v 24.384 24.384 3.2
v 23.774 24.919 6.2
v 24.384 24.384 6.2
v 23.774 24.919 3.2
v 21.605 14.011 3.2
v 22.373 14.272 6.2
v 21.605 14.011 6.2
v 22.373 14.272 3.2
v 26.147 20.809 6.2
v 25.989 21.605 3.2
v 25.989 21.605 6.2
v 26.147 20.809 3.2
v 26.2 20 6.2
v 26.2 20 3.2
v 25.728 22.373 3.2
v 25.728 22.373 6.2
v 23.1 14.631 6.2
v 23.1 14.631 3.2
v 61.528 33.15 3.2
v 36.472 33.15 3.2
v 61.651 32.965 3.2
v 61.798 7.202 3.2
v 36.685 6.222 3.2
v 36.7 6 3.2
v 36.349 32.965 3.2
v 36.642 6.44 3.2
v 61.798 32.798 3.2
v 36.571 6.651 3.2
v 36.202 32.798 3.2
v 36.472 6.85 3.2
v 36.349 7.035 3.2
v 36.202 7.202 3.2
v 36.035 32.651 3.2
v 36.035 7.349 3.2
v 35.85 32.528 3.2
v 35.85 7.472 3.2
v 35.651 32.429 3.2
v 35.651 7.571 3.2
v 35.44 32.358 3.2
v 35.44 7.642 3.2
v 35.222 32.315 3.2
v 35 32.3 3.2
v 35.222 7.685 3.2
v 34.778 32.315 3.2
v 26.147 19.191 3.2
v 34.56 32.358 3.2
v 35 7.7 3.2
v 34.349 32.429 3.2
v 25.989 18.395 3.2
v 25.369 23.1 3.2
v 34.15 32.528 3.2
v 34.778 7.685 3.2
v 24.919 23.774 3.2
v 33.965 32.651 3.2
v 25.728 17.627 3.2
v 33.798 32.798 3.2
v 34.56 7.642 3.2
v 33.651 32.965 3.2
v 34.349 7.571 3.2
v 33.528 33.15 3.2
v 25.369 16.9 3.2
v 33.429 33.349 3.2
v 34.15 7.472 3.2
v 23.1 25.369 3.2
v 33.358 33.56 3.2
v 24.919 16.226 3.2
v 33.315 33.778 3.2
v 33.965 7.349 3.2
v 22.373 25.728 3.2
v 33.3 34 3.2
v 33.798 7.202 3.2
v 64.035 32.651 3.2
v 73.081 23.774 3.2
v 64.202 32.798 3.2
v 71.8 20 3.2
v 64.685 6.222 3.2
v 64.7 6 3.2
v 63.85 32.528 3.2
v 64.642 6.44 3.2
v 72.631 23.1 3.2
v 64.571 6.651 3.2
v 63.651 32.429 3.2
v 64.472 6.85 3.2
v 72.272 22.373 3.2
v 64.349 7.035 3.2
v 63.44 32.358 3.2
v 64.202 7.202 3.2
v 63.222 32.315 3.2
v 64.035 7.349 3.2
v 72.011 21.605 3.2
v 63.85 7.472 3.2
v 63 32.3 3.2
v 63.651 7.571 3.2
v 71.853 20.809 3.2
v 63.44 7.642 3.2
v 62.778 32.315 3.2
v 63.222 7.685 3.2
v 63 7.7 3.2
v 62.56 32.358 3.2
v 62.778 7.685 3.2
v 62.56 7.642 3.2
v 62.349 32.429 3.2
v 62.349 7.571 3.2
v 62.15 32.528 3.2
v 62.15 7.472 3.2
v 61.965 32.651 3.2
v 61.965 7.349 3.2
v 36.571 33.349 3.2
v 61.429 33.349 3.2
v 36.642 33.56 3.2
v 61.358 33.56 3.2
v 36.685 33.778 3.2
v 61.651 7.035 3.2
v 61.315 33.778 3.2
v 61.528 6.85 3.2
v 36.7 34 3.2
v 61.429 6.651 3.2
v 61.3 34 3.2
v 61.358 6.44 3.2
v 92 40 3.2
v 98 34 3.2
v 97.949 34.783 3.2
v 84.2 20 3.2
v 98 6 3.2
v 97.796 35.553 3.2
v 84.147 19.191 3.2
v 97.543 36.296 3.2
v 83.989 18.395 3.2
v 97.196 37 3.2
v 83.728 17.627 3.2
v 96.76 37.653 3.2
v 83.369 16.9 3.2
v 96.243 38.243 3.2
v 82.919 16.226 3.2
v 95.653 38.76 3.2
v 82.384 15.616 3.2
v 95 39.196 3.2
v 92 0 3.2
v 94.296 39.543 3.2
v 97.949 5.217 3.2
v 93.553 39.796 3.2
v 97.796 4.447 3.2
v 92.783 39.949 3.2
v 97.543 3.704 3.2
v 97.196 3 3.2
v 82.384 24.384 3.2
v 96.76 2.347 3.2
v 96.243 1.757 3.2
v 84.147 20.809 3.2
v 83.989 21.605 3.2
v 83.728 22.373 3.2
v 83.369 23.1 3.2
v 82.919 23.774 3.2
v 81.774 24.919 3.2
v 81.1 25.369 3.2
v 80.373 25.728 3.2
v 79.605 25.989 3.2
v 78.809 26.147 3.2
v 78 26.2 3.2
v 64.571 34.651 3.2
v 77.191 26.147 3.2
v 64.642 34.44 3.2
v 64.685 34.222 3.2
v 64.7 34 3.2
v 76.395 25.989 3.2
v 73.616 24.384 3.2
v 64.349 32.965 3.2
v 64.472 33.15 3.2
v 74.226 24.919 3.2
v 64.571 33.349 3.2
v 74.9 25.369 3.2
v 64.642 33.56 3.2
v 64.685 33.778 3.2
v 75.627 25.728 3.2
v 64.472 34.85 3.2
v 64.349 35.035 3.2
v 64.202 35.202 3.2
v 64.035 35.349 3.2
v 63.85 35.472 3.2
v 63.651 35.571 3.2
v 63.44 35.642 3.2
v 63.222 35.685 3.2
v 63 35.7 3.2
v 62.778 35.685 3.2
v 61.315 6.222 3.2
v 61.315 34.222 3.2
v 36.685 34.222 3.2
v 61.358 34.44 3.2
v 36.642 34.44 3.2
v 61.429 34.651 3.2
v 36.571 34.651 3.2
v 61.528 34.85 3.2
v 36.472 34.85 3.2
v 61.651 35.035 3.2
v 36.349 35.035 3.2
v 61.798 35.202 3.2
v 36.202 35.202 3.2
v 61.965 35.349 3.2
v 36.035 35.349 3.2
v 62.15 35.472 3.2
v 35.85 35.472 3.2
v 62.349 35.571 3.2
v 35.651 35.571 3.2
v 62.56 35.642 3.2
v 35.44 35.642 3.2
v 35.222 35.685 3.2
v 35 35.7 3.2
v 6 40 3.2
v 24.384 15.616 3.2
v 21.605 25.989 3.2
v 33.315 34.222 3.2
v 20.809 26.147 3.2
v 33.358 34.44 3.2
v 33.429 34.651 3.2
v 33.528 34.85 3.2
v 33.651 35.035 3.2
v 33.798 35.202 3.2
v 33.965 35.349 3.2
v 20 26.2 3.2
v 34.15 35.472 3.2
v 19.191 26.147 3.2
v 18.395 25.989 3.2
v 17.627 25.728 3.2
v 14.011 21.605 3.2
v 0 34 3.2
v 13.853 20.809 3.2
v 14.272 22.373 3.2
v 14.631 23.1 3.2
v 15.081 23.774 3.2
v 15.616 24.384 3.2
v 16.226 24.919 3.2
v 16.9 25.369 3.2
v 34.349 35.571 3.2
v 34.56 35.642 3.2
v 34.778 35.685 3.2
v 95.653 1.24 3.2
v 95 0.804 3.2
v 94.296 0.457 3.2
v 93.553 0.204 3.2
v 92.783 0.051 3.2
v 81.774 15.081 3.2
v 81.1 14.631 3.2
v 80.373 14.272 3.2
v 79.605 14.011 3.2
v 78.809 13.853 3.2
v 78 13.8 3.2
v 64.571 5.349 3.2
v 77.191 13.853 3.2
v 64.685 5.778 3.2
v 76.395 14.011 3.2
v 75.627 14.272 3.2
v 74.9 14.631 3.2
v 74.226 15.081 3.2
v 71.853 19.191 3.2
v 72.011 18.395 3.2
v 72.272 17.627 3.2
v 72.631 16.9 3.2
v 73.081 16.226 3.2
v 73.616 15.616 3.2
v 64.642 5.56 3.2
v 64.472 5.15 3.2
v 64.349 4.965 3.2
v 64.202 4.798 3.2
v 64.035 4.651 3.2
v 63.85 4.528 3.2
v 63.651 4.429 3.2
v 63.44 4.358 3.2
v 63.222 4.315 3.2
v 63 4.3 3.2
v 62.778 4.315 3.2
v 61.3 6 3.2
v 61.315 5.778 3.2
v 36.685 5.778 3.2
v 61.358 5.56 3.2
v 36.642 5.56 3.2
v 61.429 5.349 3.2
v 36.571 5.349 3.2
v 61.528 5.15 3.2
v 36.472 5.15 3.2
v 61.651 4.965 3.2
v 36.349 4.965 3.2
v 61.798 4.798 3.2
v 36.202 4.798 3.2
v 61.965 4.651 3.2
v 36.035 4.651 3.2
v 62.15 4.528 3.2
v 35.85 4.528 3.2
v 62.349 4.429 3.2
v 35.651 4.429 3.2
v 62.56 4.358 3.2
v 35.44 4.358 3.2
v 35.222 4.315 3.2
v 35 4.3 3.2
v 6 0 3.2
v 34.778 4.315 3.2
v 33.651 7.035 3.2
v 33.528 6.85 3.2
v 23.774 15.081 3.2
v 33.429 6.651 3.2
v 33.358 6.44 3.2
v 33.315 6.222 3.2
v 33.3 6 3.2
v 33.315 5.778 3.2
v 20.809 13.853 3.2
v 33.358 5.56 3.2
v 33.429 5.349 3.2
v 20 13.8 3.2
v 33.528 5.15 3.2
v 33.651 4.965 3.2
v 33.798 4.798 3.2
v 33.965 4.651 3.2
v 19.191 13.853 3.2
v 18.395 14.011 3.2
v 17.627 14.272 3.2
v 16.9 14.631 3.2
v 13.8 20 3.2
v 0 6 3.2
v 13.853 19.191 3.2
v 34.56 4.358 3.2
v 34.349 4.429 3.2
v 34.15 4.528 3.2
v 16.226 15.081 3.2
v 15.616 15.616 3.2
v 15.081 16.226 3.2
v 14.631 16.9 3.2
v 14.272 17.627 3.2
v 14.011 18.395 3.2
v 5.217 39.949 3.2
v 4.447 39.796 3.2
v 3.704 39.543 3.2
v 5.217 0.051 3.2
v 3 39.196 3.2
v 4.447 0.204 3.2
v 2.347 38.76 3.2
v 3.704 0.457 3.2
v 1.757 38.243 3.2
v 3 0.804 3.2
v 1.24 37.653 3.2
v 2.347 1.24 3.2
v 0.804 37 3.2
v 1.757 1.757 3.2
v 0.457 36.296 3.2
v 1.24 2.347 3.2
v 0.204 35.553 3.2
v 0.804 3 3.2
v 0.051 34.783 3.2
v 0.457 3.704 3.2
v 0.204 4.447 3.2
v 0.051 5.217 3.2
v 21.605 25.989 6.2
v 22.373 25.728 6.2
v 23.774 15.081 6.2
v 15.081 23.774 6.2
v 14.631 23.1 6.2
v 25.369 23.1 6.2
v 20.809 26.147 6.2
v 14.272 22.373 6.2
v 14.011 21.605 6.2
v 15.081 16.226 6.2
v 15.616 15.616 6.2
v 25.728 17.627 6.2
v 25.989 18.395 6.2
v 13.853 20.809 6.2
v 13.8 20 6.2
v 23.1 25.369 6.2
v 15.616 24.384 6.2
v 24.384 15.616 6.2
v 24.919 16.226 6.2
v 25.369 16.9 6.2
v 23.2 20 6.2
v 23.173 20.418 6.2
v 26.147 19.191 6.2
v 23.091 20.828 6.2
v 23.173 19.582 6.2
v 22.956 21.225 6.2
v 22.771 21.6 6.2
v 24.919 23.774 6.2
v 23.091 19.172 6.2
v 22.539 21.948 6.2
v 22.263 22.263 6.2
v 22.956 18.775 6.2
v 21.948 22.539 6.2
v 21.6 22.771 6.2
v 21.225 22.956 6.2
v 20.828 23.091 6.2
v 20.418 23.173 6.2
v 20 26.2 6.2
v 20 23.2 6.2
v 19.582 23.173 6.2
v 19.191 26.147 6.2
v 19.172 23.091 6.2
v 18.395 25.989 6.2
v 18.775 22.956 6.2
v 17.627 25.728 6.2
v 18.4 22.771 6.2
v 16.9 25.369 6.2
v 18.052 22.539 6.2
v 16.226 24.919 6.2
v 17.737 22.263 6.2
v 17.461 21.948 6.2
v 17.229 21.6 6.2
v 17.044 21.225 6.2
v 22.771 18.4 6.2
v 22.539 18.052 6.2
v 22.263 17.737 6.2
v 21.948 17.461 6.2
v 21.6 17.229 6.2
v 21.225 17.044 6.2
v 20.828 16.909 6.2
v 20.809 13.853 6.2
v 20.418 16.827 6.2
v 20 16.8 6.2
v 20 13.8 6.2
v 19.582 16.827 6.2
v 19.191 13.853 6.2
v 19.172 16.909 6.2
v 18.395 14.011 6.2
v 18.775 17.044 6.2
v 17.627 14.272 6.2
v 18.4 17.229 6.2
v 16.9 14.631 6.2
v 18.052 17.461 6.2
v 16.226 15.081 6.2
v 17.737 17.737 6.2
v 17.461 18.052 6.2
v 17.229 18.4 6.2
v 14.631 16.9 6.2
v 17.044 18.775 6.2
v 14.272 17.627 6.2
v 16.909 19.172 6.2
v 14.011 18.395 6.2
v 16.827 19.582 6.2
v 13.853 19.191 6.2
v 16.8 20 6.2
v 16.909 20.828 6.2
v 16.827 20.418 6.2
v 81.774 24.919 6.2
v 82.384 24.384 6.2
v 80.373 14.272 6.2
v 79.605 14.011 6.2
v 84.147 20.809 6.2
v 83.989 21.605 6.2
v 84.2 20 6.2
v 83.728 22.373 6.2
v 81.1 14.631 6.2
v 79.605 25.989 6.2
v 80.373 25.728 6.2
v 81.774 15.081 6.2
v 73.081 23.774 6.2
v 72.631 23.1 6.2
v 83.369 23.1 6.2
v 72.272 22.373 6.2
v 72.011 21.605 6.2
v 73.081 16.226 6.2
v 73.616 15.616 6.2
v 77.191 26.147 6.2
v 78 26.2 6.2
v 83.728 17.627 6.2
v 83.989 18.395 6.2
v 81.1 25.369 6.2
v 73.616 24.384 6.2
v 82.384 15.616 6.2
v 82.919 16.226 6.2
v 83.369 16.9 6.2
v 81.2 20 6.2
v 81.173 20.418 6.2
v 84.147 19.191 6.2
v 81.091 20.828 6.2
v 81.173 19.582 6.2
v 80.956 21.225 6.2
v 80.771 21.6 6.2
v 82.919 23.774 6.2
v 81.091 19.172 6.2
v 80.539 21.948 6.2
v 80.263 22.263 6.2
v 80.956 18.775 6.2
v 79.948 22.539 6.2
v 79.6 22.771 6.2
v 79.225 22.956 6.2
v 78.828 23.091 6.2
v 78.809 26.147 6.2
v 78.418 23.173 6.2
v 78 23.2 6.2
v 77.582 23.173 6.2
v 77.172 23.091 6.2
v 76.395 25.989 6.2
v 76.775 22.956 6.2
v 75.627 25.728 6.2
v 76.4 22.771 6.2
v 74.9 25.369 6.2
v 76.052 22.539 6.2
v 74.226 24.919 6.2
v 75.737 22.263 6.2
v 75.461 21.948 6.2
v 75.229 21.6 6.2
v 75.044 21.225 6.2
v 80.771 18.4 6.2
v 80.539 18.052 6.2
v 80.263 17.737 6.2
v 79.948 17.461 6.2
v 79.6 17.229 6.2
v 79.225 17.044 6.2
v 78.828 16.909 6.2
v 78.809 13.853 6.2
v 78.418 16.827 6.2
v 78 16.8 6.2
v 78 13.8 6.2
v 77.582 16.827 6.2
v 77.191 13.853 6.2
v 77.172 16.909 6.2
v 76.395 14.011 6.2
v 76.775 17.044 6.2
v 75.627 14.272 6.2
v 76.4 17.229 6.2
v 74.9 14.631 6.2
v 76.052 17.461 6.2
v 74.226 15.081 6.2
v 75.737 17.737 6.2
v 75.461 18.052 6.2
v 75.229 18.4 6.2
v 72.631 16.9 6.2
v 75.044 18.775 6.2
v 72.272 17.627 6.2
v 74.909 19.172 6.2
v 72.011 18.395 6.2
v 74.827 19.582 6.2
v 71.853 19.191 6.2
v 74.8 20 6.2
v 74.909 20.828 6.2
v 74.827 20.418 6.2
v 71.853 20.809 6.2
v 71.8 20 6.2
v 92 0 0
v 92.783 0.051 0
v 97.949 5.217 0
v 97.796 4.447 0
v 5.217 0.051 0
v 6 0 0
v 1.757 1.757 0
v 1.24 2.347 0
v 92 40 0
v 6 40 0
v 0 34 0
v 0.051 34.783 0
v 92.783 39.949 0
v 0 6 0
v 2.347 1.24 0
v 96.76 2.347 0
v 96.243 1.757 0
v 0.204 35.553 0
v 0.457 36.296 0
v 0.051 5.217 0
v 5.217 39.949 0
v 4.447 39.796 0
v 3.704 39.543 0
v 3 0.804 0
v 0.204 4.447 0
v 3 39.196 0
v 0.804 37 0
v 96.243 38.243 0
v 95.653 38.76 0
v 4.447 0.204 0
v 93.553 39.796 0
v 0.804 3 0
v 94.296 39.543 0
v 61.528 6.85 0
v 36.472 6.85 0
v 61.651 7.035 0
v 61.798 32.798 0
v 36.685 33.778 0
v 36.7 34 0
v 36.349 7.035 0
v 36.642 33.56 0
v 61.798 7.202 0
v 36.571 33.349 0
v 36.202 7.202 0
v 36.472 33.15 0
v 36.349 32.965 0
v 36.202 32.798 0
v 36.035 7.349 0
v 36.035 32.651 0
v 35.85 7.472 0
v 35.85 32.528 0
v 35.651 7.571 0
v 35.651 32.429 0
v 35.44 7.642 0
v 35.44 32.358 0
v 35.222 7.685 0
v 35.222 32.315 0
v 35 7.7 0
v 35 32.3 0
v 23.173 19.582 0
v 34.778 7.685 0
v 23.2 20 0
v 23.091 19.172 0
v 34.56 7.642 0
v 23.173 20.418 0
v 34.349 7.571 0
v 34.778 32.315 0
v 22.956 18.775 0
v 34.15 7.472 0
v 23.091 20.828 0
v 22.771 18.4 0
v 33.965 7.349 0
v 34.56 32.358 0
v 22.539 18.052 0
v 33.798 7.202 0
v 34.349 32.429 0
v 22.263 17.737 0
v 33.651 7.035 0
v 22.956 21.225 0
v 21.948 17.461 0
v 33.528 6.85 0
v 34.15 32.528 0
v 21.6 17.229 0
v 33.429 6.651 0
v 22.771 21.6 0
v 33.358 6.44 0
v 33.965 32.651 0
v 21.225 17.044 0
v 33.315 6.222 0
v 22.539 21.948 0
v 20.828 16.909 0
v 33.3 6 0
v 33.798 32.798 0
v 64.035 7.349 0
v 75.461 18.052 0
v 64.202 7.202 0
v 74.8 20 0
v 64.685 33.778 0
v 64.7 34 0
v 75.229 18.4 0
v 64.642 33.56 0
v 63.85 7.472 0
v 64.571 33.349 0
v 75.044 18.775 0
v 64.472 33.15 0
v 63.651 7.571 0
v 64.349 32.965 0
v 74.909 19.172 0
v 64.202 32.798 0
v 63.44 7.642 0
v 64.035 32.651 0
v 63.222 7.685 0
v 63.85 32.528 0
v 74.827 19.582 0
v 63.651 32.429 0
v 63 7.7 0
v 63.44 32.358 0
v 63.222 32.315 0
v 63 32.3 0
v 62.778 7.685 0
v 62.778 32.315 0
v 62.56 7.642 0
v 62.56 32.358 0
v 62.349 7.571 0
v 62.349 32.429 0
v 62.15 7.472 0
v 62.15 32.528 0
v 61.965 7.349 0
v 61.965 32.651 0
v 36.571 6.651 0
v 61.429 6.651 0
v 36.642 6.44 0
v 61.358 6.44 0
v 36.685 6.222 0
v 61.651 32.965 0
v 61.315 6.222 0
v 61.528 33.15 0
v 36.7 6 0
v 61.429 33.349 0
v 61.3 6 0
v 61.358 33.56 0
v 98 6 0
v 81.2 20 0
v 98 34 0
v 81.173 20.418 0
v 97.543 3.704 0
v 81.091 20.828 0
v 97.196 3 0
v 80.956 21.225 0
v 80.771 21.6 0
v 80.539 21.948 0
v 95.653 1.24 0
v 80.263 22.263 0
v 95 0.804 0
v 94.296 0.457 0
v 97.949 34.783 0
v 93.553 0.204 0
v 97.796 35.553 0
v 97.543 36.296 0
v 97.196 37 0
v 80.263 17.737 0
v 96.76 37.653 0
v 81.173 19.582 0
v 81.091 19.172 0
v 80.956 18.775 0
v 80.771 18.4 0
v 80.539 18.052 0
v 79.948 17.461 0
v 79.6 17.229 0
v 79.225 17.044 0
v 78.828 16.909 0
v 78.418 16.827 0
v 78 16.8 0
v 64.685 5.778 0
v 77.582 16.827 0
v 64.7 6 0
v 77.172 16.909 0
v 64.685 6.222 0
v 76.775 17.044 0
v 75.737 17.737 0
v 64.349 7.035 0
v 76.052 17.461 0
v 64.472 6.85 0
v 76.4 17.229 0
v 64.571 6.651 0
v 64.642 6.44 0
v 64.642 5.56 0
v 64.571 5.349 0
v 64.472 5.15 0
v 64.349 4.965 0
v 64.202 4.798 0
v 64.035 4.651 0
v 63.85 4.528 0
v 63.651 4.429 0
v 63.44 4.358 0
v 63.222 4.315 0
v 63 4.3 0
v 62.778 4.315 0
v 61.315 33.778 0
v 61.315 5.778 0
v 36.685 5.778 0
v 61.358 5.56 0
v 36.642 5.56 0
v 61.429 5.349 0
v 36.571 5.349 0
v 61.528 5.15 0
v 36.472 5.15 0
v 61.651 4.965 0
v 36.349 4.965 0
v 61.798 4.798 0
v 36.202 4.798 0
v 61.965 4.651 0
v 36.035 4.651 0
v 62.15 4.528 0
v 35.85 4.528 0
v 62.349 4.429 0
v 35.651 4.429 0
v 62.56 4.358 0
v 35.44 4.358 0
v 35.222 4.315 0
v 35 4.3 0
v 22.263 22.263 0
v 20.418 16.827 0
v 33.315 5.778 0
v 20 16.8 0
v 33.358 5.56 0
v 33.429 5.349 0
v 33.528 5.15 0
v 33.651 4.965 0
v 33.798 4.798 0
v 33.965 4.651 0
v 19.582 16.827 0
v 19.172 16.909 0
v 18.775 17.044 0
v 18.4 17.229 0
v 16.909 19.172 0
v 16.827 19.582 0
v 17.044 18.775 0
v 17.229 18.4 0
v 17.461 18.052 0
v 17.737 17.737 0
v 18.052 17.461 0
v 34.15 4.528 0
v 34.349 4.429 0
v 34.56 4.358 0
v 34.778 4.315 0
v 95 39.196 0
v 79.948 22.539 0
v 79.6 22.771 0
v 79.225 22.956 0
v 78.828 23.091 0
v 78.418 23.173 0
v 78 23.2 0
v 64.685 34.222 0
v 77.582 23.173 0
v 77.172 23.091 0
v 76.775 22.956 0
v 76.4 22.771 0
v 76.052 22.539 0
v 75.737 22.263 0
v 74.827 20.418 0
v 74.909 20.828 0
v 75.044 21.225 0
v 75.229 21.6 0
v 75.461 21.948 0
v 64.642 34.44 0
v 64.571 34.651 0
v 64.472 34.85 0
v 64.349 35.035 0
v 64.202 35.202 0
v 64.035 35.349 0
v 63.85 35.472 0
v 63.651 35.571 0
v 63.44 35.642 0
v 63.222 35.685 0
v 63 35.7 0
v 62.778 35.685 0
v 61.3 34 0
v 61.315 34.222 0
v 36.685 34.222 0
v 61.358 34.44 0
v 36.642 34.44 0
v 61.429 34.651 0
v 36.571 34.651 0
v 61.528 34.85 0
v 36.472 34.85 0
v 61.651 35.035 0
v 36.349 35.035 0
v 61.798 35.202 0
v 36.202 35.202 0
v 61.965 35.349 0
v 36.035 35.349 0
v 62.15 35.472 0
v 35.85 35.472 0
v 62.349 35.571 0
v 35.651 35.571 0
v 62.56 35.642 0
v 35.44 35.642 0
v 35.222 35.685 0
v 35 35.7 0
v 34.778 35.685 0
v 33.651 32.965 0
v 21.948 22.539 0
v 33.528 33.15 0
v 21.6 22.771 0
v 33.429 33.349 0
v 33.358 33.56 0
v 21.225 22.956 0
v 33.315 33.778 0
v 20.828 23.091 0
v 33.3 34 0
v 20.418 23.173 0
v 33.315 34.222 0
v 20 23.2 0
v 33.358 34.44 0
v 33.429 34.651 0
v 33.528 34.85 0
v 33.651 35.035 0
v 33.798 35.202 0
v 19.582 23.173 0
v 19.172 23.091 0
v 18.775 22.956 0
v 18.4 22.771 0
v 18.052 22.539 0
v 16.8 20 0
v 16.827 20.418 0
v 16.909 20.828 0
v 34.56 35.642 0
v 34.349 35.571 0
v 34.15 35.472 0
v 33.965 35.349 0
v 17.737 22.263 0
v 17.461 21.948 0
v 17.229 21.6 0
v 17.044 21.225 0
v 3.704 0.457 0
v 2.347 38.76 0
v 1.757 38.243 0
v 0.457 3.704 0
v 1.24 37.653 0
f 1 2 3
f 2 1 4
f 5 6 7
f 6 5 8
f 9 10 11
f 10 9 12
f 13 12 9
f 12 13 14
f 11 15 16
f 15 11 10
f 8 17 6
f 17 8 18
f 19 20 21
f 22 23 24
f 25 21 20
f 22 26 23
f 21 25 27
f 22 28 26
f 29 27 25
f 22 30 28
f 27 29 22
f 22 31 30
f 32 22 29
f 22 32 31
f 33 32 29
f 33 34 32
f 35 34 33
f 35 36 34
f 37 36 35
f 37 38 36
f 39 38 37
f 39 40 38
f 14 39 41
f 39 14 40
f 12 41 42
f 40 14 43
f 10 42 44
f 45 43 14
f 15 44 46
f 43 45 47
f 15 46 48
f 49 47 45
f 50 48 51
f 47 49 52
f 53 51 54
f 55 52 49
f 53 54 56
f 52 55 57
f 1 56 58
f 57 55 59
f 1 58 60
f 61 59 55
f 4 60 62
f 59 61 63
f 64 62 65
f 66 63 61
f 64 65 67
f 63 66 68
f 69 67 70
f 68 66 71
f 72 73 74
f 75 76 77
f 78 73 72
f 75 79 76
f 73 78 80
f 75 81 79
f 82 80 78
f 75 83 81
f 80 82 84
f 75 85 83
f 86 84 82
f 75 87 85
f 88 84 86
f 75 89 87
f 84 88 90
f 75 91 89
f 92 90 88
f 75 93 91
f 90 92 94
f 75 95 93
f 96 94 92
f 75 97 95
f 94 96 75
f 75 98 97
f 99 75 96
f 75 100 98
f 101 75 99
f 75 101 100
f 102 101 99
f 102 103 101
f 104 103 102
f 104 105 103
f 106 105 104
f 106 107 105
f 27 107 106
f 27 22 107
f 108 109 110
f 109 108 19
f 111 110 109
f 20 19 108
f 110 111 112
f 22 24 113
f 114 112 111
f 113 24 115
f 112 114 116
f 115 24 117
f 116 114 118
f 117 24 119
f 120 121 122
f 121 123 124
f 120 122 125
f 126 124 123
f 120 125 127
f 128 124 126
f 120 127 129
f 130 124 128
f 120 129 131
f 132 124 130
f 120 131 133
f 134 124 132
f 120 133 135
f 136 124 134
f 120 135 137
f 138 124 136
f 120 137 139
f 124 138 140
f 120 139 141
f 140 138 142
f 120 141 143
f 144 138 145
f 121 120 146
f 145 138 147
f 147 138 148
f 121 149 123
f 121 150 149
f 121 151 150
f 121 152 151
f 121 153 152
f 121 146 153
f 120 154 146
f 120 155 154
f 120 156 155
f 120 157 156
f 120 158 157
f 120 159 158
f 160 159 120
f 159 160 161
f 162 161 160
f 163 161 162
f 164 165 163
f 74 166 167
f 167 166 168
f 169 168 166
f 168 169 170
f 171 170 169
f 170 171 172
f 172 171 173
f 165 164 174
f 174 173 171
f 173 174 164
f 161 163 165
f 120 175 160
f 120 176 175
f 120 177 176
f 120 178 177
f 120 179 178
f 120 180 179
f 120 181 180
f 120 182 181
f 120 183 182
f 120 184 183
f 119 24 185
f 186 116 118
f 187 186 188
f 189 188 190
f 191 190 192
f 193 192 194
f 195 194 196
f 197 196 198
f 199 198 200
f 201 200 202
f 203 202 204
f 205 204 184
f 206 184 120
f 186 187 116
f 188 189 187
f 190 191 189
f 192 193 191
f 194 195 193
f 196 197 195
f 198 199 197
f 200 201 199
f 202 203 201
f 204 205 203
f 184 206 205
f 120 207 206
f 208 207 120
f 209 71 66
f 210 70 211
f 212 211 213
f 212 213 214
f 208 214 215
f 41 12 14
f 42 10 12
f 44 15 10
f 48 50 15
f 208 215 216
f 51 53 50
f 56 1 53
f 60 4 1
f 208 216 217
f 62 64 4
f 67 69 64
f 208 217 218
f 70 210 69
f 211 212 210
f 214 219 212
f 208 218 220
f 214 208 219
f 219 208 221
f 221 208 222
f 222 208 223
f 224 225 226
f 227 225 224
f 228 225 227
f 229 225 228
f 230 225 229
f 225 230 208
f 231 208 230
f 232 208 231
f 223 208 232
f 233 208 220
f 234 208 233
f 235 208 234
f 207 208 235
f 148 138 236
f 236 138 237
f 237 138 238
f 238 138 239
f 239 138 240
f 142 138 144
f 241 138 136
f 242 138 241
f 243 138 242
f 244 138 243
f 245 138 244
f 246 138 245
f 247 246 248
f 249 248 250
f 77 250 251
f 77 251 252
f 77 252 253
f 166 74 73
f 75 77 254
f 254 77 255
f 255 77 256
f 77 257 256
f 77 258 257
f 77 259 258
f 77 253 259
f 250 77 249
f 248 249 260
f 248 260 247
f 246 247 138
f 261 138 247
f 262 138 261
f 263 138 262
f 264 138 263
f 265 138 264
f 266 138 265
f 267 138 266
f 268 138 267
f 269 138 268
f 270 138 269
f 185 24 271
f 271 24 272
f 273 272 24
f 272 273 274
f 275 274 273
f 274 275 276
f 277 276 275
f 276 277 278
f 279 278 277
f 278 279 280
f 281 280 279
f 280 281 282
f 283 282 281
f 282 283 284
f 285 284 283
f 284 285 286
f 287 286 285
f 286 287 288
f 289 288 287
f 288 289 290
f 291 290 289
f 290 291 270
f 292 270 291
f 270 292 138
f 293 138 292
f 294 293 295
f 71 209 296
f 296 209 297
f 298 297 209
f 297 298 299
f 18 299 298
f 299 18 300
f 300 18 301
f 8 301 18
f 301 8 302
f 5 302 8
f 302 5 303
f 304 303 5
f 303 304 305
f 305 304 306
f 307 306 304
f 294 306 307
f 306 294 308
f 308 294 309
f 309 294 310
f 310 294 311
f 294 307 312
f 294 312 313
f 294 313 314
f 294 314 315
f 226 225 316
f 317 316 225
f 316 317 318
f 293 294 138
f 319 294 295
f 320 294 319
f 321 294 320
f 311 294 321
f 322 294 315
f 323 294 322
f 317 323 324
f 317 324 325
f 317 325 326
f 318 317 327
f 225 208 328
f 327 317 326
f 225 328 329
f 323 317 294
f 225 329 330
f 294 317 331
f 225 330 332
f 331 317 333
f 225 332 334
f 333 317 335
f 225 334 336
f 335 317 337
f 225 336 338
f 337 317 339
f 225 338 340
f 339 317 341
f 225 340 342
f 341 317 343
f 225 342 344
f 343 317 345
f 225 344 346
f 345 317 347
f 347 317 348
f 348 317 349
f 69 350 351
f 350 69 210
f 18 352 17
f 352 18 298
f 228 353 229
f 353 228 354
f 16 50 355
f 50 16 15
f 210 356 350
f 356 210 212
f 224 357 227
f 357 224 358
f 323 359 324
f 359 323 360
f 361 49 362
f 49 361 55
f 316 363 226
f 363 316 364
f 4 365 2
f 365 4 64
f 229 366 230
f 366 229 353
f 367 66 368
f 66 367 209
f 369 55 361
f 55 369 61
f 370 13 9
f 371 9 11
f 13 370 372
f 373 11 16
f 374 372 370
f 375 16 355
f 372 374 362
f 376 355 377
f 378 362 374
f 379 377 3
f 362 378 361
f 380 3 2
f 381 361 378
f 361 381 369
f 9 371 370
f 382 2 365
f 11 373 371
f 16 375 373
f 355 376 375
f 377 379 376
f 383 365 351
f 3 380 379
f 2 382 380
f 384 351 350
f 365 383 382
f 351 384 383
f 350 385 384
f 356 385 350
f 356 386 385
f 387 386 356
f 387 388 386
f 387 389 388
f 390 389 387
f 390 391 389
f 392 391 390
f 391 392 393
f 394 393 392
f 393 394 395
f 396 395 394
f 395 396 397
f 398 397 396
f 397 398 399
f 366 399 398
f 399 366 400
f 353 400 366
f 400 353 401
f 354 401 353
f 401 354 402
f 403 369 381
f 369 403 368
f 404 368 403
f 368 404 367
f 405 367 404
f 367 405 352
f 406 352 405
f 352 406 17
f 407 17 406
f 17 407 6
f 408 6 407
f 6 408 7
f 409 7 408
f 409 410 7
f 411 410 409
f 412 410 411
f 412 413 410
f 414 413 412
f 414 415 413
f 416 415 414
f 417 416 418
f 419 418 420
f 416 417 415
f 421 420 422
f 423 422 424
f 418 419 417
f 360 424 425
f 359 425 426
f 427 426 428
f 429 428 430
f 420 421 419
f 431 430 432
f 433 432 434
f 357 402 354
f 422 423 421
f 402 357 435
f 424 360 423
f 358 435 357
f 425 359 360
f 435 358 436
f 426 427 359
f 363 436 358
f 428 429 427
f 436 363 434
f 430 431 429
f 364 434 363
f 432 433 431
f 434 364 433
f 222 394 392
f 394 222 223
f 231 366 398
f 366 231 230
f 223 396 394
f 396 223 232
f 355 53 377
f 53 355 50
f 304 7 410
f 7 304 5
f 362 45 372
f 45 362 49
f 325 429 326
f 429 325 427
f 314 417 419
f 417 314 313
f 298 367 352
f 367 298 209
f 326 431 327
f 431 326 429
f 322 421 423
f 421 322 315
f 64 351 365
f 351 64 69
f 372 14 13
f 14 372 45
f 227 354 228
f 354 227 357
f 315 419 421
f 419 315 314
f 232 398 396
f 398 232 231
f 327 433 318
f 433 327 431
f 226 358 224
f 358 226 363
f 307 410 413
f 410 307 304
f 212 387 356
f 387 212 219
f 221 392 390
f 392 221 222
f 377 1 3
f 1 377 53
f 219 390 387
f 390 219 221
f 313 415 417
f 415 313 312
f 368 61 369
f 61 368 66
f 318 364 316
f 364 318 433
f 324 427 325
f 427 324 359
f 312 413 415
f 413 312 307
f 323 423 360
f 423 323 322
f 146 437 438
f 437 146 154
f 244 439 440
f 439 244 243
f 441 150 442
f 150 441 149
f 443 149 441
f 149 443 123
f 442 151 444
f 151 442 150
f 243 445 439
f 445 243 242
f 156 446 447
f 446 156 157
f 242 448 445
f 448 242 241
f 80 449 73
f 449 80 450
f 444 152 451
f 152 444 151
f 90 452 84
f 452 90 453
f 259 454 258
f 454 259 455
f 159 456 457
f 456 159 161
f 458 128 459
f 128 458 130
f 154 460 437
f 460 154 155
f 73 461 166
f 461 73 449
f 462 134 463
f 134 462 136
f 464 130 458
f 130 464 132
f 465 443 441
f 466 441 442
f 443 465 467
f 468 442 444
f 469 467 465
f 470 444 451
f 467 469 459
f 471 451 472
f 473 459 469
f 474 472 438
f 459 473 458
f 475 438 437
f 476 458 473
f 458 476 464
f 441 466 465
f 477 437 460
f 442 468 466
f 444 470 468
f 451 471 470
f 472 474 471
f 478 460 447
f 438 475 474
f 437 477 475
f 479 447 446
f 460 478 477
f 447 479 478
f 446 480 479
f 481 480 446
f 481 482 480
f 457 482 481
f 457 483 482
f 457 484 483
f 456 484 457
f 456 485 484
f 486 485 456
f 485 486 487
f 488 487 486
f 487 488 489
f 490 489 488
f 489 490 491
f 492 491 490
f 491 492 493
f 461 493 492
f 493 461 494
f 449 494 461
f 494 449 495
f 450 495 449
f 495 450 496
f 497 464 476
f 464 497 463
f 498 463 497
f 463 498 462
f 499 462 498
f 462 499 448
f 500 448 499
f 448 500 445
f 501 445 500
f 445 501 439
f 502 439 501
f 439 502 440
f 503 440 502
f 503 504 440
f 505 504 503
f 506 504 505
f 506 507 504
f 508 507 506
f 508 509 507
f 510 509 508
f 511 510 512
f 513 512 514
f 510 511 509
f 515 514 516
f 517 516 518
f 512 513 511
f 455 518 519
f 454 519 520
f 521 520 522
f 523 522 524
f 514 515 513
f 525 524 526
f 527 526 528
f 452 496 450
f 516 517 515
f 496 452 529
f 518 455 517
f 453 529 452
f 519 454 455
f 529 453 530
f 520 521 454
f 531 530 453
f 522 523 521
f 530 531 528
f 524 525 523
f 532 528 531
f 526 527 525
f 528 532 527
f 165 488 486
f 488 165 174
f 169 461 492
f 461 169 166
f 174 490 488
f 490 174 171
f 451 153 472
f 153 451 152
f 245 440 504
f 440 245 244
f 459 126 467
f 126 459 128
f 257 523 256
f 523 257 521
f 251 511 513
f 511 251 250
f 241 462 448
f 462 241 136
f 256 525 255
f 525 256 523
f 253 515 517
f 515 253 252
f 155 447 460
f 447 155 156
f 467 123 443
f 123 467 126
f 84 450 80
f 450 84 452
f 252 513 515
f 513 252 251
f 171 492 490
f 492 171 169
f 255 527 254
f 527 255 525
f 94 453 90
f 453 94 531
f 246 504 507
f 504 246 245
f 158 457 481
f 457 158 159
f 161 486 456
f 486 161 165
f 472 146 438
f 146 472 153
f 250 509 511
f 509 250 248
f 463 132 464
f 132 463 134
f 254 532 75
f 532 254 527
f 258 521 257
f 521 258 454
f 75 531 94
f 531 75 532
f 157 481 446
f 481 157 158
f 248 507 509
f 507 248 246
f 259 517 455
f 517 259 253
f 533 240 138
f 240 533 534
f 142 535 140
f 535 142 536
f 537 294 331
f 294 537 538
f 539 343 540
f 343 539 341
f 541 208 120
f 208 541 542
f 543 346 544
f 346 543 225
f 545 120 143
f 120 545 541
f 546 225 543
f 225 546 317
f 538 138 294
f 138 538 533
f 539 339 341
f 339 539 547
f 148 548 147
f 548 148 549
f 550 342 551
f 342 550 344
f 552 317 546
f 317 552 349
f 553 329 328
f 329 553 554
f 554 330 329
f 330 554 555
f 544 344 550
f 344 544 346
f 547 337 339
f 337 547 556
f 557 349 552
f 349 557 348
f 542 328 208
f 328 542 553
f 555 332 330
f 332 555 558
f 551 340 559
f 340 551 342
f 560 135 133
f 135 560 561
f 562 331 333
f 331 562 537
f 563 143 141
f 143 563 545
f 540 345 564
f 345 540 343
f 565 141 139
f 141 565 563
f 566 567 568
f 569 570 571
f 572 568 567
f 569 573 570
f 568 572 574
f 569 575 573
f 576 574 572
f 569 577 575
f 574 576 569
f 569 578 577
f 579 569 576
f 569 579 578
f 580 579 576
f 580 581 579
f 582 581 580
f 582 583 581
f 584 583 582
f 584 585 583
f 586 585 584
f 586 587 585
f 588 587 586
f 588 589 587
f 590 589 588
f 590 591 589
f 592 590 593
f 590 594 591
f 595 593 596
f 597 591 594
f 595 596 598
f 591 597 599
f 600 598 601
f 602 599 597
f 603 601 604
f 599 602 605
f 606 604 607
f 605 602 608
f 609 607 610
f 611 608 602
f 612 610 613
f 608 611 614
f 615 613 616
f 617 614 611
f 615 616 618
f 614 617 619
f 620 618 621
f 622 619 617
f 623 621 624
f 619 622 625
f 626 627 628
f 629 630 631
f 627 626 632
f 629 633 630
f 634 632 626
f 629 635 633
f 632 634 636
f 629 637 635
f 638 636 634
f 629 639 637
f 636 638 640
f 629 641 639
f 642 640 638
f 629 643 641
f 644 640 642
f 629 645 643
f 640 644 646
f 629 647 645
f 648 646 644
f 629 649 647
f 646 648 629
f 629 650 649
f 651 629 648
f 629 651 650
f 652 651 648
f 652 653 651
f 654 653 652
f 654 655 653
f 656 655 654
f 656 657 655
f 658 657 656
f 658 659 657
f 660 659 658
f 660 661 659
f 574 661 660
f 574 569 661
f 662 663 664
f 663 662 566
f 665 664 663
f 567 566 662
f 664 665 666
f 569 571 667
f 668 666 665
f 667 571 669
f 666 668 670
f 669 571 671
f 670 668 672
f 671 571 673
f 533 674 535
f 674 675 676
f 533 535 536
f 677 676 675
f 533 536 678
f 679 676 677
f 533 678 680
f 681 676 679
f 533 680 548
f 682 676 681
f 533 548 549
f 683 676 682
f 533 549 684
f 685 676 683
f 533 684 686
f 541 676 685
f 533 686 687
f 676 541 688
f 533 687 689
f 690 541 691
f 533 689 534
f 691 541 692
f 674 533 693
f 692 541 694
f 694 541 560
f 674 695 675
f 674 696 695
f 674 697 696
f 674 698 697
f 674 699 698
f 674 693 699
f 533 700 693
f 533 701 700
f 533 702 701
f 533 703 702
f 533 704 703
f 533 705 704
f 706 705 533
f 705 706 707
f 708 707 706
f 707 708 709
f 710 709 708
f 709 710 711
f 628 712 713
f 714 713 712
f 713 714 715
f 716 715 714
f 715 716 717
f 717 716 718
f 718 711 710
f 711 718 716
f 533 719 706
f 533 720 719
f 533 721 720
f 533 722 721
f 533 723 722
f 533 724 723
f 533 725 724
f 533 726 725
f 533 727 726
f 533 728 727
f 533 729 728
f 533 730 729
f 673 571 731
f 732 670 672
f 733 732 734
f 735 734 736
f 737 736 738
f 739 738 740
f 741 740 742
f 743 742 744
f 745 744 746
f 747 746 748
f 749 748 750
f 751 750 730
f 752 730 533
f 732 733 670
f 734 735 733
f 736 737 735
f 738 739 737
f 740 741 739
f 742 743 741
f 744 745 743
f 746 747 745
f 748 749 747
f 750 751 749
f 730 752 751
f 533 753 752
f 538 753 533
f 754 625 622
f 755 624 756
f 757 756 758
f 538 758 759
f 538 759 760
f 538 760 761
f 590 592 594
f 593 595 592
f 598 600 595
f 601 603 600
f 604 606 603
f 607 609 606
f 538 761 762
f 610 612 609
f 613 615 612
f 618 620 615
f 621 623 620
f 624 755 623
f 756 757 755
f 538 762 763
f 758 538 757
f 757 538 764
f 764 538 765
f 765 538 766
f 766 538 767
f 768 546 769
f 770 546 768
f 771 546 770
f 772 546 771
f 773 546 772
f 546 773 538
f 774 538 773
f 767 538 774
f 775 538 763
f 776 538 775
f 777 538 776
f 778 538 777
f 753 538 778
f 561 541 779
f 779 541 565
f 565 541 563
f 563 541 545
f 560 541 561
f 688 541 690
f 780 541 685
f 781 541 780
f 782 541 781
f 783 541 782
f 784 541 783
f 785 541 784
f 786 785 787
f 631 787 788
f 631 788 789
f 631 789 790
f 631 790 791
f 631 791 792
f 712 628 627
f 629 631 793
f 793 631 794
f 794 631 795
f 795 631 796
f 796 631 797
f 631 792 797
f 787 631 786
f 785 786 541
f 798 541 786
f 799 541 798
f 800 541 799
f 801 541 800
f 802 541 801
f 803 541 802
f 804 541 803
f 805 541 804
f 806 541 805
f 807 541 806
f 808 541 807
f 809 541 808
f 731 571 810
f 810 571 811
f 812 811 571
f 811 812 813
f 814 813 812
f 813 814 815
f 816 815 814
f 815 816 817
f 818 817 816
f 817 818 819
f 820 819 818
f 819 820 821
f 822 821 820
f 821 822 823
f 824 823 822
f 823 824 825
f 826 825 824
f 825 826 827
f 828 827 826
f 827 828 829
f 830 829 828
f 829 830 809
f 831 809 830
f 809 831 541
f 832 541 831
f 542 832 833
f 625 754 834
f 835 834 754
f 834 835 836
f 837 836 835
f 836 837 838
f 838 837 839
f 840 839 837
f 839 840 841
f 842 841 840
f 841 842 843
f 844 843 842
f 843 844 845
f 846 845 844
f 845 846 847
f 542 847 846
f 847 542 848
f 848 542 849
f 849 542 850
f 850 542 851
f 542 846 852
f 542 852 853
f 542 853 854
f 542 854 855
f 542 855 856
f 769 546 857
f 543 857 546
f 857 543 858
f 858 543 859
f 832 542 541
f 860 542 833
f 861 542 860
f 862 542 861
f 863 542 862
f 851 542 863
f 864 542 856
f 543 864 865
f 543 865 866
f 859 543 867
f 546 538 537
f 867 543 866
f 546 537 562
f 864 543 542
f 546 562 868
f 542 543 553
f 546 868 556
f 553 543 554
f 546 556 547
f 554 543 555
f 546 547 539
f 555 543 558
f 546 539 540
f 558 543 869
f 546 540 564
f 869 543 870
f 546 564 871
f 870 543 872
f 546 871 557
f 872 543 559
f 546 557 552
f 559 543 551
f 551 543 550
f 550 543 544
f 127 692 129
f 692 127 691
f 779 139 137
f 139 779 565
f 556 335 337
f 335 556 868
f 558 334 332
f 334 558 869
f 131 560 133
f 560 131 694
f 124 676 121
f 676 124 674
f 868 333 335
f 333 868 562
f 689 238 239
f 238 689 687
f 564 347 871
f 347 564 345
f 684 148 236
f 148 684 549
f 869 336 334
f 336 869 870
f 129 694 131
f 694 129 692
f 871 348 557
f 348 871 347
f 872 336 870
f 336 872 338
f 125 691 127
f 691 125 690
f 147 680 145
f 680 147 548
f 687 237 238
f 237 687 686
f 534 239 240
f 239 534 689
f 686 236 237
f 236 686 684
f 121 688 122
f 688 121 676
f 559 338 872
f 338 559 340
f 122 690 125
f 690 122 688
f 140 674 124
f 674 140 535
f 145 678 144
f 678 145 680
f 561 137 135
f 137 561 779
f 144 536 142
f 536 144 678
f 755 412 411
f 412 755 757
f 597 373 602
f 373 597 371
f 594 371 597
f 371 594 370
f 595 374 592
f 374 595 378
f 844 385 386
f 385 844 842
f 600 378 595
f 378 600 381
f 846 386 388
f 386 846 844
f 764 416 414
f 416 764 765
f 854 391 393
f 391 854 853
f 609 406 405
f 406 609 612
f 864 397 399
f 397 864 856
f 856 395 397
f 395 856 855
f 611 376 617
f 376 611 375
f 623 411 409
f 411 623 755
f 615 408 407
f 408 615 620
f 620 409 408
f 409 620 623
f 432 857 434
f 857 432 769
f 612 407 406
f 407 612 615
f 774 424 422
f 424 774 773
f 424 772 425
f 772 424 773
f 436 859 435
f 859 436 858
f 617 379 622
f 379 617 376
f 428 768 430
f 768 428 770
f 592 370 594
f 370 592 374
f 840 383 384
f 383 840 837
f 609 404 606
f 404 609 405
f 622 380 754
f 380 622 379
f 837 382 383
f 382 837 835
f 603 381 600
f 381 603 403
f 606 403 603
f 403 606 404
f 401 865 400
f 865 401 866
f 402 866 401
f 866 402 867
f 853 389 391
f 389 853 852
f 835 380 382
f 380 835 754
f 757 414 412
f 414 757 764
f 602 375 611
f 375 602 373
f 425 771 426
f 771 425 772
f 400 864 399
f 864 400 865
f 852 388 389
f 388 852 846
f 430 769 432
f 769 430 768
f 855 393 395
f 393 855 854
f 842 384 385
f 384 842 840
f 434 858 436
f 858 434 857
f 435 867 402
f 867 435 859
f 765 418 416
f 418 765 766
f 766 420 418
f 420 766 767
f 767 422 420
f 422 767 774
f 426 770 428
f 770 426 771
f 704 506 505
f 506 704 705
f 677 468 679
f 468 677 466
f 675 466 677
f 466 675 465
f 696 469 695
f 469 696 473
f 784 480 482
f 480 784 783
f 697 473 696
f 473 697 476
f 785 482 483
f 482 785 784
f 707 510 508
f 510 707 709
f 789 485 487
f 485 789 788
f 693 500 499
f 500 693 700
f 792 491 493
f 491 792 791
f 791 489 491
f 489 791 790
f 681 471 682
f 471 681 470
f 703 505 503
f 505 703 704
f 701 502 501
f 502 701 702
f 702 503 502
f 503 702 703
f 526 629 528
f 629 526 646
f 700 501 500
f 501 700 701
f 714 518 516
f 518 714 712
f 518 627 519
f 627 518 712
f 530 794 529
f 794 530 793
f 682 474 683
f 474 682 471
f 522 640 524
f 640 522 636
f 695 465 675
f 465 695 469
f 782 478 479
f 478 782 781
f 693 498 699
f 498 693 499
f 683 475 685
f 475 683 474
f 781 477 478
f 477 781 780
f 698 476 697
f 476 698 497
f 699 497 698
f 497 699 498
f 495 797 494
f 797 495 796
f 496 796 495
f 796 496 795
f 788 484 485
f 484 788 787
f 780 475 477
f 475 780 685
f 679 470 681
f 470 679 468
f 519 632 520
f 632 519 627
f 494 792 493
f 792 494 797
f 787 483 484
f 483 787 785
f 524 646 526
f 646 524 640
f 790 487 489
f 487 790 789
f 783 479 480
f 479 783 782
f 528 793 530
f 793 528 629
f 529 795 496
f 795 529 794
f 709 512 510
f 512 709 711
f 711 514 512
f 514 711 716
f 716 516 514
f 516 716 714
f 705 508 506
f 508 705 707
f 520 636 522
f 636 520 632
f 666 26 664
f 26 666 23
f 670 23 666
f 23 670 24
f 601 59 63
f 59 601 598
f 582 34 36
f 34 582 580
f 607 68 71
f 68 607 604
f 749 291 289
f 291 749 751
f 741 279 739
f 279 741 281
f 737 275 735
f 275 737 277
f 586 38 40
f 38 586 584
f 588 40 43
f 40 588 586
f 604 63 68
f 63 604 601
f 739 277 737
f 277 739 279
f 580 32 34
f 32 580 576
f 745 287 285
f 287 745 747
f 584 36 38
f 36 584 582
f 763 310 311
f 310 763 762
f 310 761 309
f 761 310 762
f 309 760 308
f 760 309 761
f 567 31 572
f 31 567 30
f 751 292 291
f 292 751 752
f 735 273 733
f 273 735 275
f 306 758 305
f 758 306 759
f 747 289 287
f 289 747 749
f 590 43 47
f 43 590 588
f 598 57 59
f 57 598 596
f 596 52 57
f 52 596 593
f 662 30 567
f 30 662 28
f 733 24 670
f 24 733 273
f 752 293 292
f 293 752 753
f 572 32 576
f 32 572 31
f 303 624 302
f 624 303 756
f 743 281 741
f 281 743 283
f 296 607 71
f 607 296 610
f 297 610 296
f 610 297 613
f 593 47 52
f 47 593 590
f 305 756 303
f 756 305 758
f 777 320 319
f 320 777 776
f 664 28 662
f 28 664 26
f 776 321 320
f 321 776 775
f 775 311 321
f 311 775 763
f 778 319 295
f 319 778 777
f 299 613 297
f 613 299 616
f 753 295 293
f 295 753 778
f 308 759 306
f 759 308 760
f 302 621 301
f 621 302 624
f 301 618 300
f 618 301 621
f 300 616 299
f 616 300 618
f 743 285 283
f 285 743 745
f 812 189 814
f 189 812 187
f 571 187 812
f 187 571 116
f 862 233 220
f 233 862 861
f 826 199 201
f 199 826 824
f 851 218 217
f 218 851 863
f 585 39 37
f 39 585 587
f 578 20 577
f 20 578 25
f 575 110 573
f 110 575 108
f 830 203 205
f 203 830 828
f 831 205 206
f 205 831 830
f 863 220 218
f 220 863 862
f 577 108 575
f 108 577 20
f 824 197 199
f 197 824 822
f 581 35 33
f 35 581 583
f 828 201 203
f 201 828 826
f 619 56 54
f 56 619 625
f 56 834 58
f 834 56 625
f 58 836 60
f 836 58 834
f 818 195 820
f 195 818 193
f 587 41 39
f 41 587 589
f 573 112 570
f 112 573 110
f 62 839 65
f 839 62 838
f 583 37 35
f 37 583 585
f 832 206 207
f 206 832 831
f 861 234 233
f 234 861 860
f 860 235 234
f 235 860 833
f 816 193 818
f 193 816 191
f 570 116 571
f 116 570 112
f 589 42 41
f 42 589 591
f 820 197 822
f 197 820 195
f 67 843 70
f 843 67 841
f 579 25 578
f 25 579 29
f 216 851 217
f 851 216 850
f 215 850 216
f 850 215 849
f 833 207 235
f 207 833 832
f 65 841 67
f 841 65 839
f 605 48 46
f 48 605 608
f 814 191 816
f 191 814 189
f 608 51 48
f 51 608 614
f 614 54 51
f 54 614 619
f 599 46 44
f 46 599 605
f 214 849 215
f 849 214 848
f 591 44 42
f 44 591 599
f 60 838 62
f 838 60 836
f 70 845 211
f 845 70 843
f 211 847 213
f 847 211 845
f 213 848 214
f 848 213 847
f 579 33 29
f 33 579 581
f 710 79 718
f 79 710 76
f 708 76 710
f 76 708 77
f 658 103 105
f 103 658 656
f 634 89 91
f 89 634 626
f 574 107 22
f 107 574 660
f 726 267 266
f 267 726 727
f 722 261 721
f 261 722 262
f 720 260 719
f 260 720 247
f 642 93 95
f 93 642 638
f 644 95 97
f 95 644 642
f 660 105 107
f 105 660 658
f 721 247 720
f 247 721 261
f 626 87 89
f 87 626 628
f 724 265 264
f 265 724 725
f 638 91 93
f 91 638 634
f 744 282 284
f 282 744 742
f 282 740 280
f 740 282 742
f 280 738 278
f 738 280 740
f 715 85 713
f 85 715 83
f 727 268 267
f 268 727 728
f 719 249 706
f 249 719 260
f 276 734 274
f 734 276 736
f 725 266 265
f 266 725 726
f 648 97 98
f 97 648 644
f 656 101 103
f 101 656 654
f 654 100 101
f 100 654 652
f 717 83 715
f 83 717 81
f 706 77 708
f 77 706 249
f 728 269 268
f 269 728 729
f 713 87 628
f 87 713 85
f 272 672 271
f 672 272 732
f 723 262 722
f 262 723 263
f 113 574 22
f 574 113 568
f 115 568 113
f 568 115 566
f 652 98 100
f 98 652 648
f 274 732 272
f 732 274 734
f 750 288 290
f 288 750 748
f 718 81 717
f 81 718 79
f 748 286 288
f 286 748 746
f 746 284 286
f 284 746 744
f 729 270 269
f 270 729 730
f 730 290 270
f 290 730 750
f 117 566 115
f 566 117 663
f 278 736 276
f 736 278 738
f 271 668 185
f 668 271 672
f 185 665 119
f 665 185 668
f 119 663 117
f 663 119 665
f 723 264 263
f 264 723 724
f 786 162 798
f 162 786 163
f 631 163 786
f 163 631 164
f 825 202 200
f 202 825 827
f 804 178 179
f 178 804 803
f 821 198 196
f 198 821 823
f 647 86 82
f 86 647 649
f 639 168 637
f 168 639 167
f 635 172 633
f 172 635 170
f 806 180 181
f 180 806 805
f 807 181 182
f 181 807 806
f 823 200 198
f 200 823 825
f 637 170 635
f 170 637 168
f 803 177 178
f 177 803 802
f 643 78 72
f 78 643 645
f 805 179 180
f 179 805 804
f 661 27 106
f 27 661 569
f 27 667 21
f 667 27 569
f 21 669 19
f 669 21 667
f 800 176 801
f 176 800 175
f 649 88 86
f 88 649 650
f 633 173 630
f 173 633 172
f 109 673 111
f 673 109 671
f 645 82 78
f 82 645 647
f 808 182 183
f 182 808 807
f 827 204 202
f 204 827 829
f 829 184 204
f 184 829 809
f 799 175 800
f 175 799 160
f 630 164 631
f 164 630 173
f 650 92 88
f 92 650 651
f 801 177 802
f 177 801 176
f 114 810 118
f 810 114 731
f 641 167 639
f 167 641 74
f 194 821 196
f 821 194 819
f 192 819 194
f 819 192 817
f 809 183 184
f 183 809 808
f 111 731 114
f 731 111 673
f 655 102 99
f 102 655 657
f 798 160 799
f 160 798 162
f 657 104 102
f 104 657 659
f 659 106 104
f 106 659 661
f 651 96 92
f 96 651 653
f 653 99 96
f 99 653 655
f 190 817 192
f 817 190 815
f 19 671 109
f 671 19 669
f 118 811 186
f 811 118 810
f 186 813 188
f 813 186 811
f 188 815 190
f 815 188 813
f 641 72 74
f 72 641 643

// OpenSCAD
// file: walle_params.scad
// SPDX-License-Identifier: MIT
// Shared dimensions for every Wall-E part.
//
// These names and values match 3d-models/tools/gen_stl.py exactly. If you
// change something here, change it there too (or just regenerate from these
// files with OpenSCAD and ignore the Python generator entirely - it exists
// only so the repo ships STLs for people without OpenSCAD installed).

$fn = 48;                   // facets on curves; 48 is smooth at this scale

// ---- general -------------------------------------------------------------
wall        = 2.4;          // 6 perimeters at a 0.4 mm nozzle
floor_t     = 2.4;
clearance   = 0.3;          // between mating printed parts

// ---- body ----------------------------------------------------------------
body_w      = 86;           // left-right, inside the track frames
body_d      = 76;           // front-back
body_h      = 38;           // floor to open top

// ---- head ----------------------------------------------------------------
head_w      = 70;
head_d      = 45;
head_h      = 40;
oled_win_w  = 27;           // visible area of a 0.96" SSD1306
oled_win_h  = 15;

// ---- fasteners -----------------------------------------------------------
// Radii, already oversized ~0.2 mm because FDM printers shrink holes.
m2          = 1.2;
m25         = 1.45;
m3          = 1.7;
axle        = 3.2;          // 6 mm axle / M6 shank

// ---- drive ---------------------------------------------------------------
wheel_r     = 16;
wheel_h     = 9;
wheel_gap   = 58;           // drive-to-idler centre distance
belt_w      = 12;
belt_t      = 1.6;

// ---- servos --------------------------------------------------------------
// SG90 / MG90S / FS90R all share this body.
servo_body  = [23, 12.5, 22.5];
servo_screw_pitch = 27.5;

// Convenience: a rounded slab, the shape most of these parts start from.
module slab(size, r = 3) {
    linear_extrude(height = size[2])
        offset(r = r) offset(r = -r)
            square([size[0], size[1]]);
}
// main file
// SPDX-License-Identifier: MIT
// Drive train: side frames, wheels and the flexible printed belt.
//
//   openscad -o ../stl/drive_wheel.stl -D 'part="drive_wheel"' tracks.scad
//
// The belt prints flat in TPU as a closed loop, then stretches over the two
// wheels. Individual printed links with pins look better in renders and shed
// themselves across the desk at this scale.

include <walle_params.scad>

part = "track_frame";  // track_frame | drive_wheel | idler_wheel | track_belt

if (part == "track_frame")      track_frame();
else if (part == "drive_wheel") drive_wheel();
else if (part == "idler_wheel") idler_wheel();
else if (part == "track_belt")  track_belt();

frame_l = wheel_gap + 2 * wheel_r + 8;
frame_h = 2 * wheel_r + 8;
frame_t = 3.2;

module track_frame() {
    axle_y = frame_h / 2;
    difference() {
        union() {
            slab([frame_l, frame_h, frame_t], 6);
            // Axle bosses give the shaft more bearing surface.
            for (cx = [wheel_r + 4, wheel_r + 4 + wheel_gap])
                translate([cx, axle_y, frame_t]) cylinder(h = 3, r = axle + 3);
        }
        for (cx = [wheel_r + 4, wheel_r + 4 + wheel_gap])
            translate([cx, axle_y, -1]) cylinder(h = frame_t + 8, r = axle);
        for (x = [frame_l / 2 - 14, frame_l / 2 + 14], y = [6, frame_h - 6])
            translate([x, y, -1]) cylinder(h = frame_t + 2, r = m3);
    }
}

module drive_wheel() {
    difference() {
        union() {
            cylinder(h = wheel_h, r = wheel_r - 2);
            // Rim nubs: these are what grip the TPU belt. A fine-toothed
            // sprocket strips at this scale.
            for (i = [0 : 9])
                rotate([0, 0, i * 36])
                    translate([wheel_r - 2, 0, 0]) cylinder(h = wheel_h, r = 2.2);
            // Flanges stop the belt walking off.
            translate([0, 0, -1.6]) cylinder(h = 1.6, r = wheel_r + 1.5);
            translate([0, 0, wheel_h]) cylinder(h = 1.6, r = wheel_r + 1.5);
        }
        translate([0, 0, -3]) cylinder(h = wheel_h + 6, r = axle);
        // Screws into the servo horn, standard 5 mm pitch.
        for (dx = [-5, 5]) translate([dx, 0, -3]) cylinder(h = wheel_h + 6, r = m2);
    }
}

module idler_wheel() {
    difference() {
        union() {
            cylinder(h = wheel_h, r = wheel_r - 2);
            translate([0, 0, -1.6]) cylinder(h = 1.6, r = wheel_r + 1.5);
            translate([0, 0, wheel_h]) cylinder(h = 1.6, r = wheel_r + 1.5);
        }
        translate([0, 0, -3]) cylinder(h = wheel_h + 6, r = axle);
    }
}

module track_belt() {
    r = wheel_r - 1;
    linear_extrude(height = belt_t)
        difference() {
            hull() for (dx = [-wheel_gap / 2, wheel_gap / 2])
                translate([dx, 0]) circle(r = r);
            hull() for (dx = [-wheel_gap / 2, wheel_gap / 2])
                translate([dx, 0]) circle(r = r - belt_w);
        }
}
